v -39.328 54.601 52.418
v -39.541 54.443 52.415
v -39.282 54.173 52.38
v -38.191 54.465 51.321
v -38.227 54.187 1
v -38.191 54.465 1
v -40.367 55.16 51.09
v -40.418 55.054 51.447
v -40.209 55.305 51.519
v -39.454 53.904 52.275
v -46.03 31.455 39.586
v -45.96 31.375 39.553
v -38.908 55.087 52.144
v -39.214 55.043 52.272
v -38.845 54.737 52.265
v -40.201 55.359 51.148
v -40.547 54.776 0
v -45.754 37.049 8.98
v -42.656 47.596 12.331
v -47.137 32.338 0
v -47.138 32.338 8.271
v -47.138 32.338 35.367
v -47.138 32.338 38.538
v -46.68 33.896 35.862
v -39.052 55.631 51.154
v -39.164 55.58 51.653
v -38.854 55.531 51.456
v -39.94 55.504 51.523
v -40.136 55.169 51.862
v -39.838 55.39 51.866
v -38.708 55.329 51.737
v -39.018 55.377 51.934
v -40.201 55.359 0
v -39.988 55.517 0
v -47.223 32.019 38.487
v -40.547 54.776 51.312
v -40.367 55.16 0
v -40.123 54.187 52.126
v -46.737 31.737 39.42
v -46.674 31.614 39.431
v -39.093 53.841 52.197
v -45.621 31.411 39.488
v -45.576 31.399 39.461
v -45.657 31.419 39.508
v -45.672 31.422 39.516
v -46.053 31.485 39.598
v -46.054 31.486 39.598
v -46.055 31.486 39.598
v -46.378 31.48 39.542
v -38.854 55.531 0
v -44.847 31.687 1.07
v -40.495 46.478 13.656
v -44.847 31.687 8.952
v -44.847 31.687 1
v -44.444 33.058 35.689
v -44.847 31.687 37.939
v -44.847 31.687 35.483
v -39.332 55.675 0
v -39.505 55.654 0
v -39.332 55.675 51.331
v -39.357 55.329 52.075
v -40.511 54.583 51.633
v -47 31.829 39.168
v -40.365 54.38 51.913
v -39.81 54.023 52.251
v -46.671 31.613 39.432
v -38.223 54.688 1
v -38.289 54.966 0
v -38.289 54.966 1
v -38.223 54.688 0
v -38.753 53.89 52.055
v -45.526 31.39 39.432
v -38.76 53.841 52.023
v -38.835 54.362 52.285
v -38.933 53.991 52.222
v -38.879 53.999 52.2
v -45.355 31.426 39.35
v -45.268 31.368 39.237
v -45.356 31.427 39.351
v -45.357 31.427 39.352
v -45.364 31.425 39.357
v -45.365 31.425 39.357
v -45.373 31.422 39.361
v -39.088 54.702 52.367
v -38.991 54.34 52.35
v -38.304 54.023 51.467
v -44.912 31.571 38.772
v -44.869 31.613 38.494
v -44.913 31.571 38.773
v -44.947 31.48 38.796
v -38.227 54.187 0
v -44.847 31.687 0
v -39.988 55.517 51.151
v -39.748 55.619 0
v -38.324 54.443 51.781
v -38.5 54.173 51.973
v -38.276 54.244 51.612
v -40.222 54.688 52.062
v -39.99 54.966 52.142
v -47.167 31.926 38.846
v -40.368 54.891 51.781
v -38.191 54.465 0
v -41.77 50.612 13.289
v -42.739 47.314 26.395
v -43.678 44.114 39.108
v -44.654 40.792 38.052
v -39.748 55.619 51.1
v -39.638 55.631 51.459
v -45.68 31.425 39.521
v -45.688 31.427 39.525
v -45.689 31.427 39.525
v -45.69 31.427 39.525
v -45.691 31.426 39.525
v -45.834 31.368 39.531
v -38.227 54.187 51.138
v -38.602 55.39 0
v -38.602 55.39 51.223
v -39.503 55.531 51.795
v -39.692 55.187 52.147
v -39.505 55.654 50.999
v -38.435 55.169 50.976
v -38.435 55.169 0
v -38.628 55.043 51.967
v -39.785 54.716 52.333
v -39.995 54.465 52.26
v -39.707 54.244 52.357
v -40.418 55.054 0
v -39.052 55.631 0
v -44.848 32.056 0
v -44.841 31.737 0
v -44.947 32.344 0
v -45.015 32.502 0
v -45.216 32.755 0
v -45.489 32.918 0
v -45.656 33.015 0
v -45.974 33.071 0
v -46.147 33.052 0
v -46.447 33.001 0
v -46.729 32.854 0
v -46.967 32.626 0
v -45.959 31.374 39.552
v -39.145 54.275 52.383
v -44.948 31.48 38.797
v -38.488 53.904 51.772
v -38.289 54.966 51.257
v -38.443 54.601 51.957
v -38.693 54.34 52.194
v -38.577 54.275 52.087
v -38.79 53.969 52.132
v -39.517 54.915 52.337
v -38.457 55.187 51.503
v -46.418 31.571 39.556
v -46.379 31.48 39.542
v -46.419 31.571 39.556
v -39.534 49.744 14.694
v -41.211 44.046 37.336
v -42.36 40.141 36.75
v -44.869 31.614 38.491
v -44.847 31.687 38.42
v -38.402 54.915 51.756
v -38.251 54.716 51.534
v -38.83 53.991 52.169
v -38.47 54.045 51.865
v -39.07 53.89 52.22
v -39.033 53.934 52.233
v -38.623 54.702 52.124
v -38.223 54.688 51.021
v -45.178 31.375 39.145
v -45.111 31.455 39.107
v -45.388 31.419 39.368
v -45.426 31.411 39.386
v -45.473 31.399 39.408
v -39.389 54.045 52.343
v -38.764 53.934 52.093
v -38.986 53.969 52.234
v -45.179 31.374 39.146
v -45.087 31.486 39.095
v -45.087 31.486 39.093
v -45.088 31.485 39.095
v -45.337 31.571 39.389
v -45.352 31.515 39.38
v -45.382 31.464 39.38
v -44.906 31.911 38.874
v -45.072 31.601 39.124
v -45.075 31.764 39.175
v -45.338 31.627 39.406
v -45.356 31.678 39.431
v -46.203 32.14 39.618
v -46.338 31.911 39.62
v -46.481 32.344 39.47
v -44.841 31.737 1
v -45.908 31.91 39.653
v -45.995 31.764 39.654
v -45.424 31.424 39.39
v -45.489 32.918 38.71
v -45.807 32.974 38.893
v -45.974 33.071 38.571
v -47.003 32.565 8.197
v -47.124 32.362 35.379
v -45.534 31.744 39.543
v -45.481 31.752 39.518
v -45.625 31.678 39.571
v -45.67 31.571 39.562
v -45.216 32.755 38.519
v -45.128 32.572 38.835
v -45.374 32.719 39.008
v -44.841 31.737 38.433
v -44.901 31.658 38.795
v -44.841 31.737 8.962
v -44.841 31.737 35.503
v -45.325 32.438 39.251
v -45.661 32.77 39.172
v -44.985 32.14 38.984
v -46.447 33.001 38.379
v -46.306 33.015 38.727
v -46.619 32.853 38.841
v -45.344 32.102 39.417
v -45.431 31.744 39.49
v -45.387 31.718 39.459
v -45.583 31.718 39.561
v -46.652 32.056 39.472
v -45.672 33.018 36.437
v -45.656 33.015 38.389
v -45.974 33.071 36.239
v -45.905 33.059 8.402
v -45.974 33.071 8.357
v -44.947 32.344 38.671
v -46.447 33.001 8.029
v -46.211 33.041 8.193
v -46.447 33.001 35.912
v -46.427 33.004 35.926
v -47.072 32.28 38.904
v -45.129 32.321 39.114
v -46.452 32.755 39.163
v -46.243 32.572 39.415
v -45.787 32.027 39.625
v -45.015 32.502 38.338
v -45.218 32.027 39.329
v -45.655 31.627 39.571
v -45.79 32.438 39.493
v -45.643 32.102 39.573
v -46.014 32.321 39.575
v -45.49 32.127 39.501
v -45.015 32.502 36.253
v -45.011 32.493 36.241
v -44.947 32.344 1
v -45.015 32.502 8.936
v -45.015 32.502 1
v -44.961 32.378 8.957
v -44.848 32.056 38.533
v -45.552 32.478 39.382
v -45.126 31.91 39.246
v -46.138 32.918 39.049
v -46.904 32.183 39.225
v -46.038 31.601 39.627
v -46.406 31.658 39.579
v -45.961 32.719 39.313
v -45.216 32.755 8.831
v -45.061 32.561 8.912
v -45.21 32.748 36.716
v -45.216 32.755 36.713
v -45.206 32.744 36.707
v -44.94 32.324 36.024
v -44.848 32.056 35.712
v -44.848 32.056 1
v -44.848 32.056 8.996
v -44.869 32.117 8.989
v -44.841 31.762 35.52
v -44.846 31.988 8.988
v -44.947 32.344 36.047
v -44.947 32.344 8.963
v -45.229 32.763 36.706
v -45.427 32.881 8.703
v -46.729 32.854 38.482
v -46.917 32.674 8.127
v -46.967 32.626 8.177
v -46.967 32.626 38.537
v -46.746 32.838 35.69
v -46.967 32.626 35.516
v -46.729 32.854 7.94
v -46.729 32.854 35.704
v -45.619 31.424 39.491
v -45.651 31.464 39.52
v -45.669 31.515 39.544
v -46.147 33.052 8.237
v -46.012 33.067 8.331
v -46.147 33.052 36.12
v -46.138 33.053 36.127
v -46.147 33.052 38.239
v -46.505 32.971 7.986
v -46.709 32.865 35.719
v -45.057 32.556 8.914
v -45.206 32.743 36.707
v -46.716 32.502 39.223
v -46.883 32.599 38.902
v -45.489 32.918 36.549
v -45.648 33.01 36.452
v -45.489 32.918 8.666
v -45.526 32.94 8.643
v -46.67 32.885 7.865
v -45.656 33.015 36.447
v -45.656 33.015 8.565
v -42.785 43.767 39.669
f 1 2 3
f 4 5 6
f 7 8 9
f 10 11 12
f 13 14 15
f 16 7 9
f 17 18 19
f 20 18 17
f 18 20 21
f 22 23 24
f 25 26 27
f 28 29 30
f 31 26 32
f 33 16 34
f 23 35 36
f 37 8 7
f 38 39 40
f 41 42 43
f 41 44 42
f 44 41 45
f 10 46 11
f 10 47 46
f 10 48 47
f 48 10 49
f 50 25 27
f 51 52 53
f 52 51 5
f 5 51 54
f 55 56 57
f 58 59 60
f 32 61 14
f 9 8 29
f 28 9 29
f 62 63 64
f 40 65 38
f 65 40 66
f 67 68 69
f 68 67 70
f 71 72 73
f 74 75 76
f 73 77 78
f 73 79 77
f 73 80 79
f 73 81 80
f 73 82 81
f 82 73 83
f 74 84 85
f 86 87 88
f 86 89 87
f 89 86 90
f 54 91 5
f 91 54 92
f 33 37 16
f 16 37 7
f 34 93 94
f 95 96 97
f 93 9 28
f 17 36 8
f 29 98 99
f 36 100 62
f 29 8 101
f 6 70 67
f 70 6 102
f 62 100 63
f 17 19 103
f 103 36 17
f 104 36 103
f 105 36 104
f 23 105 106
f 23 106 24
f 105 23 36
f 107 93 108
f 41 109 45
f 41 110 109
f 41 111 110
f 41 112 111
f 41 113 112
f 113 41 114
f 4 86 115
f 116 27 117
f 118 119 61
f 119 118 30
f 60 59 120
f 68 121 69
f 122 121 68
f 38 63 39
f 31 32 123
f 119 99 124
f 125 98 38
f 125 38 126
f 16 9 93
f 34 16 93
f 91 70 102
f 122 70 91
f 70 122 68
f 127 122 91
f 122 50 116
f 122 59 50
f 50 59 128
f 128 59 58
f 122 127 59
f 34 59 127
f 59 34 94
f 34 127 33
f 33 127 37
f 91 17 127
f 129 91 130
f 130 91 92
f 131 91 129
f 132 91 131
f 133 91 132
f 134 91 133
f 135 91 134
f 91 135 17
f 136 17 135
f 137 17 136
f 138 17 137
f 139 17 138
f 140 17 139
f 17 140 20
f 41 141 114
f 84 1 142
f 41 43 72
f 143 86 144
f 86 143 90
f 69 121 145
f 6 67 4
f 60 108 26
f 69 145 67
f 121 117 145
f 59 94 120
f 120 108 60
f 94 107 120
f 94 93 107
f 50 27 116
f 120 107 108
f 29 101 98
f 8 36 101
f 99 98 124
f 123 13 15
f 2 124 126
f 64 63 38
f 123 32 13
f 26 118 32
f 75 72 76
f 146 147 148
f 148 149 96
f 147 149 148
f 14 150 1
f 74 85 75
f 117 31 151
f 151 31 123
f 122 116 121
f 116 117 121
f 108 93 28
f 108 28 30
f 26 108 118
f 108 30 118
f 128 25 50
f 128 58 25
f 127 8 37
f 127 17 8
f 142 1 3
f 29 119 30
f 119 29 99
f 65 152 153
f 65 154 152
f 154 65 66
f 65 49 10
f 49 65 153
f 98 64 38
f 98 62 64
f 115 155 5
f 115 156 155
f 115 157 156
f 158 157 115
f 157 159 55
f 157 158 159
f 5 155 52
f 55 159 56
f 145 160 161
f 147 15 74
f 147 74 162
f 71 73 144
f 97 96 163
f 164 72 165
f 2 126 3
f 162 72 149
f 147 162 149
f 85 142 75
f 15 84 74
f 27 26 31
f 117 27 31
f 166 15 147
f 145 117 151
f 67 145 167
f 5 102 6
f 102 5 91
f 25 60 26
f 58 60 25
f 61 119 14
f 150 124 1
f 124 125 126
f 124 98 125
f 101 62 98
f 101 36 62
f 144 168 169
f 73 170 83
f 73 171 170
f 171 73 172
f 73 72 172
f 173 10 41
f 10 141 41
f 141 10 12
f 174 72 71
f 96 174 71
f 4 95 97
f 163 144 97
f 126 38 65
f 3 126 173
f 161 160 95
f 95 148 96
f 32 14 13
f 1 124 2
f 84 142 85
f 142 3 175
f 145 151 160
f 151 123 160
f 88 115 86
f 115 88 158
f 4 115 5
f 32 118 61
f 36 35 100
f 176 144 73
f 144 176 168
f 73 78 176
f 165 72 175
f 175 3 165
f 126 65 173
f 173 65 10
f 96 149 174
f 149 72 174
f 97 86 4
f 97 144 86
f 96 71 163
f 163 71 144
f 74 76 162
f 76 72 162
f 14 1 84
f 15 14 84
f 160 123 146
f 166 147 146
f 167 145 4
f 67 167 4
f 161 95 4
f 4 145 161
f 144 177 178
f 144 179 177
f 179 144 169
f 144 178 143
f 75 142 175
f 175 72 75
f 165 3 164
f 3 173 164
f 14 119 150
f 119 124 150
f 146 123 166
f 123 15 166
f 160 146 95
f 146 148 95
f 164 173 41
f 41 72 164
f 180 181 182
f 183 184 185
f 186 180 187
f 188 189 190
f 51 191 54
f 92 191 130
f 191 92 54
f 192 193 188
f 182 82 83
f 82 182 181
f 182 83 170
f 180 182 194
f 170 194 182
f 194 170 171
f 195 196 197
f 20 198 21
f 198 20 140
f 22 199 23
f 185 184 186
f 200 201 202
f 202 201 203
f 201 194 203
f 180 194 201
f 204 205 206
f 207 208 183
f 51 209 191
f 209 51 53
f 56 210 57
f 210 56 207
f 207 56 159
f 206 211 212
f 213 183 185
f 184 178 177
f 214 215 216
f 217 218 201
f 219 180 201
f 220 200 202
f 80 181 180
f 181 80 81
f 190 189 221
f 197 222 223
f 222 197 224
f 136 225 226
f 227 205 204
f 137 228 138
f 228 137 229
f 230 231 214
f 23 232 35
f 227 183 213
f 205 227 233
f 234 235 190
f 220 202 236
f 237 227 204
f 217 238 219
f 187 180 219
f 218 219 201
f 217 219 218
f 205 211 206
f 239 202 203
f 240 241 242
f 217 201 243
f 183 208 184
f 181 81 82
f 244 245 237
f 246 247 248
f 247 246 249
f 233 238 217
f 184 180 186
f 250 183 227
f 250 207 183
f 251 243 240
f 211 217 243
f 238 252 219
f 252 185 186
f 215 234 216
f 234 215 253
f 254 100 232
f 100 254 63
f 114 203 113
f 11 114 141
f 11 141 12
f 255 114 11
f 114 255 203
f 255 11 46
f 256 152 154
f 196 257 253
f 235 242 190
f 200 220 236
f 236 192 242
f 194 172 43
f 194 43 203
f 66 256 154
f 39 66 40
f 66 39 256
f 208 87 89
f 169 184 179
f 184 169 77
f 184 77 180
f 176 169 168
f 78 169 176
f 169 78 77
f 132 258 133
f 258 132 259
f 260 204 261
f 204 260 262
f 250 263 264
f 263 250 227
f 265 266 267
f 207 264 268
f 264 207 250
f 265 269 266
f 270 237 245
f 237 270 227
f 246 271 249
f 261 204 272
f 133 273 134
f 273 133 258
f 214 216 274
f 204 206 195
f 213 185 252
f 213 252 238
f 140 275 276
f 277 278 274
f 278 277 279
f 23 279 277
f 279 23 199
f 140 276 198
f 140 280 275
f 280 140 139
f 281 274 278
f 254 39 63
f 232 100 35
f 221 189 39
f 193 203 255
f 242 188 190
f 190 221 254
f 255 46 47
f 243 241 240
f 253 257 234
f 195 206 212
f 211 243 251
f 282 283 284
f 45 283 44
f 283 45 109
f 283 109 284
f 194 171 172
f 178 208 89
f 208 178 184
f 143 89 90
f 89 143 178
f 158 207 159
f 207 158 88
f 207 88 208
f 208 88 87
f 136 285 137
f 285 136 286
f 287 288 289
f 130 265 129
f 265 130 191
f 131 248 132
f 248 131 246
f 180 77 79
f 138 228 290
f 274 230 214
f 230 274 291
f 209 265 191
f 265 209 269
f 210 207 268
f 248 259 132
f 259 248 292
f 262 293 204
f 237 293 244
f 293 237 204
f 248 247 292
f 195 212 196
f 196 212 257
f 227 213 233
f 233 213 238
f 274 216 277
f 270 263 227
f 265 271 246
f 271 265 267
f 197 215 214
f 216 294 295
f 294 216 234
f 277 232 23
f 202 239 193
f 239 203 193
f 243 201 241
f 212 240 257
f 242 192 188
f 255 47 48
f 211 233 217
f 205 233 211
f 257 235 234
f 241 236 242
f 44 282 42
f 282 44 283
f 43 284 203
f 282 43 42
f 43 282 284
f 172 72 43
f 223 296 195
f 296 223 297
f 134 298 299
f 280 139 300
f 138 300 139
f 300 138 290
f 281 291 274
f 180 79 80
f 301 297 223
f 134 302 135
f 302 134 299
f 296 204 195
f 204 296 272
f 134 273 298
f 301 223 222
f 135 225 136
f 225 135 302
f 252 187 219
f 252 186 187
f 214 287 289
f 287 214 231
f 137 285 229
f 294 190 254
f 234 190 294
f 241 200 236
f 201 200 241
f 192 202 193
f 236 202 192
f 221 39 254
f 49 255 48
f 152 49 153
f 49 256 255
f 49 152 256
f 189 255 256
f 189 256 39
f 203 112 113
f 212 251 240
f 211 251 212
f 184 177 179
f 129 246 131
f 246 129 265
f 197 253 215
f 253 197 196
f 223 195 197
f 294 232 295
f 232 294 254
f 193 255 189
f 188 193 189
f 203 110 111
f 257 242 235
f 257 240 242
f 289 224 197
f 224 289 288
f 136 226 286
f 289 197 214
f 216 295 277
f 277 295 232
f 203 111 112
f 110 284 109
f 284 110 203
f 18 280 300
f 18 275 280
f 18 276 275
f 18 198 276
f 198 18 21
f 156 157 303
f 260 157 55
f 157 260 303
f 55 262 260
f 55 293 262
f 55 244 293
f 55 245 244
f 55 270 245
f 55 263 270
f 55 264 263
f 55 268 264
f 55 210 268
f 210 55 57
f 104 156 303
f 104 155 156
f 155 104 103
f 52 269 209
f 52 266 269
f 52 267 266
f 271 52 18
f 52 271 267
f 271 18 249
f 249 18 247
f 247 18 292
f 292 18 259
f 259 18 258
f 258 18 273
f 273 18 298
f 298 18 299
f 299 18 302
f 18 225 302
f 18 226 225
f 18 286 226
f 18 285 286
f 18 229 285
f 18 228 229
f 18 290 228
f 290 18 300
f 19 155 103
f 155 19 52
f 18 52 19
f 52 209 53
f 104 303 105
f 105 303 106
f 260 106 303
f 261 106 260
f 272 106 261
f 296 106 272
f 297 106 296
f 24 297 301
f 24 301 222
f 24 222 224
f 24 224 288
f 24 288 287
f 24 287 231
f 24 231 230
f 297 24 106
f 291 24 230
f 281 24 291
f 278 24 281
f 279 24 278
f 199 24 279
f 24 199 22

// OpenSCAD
difference () {
  hull () {
    hull () {
      translate ([0, 0, 13]) {
        rotate (a=14.999999999999998, v=[0, 1, 0]) {
          translate ([0, -4.35, 5.64]) {
            translate ([0, 0, 241.94387877597407]) {
              rotate (a=12.500000000000004, v=[0, 1, 0]) {
                translate ([0, 0, -241.94387877597407]) {
                  translate ([0, 0, 84.31095110414394]) {
                    rotate (a=32.7, v=[1, 0, 0]) {
                      translate ([0, 0, -84.31095110414394]) {
                        translate ([1, -1, 1]) {
                          translate ([0, 13.575, -6]) {
                            sphere ($fn=20, r=1.2);
                          }
                        }
                      }
                    }
                  }
                }
              }
            }
          }
        }
      }
      translate ([0, 0, 1/2]) {
        linear_extrude (height=1, twist=0.0, convexity=0, center=true){
          projection (cut = false) {
            translate ([0, 0, 13]) {
              rotate (a=14.999999999999998, v=[0, 1, 0]) {
                translate ([0, -4.35, 5.64]) {
                  translate ([0, 0, 241.94387877597407]) {
                    rotate (a=12.500000000000004, v=[0, 1, 0]) {
                      translate ([0, 0, -241.94387877597407]) {
                        translate ([0, 0, 84.31095110414394]) {
                          rotate (a=32.7, v=[1, 0, 0]) {
                            translate ([0, 0, -84.31095110414394]) {
                              translate ([1, -1, 1]) {
                                translate ([0, 13.575, -6]) {
                                  sphere ($fn=20, r=1.2);
                                }
                              }
                            }
                          }
                        }
                      }
                    }
                  }
                }
              }
            }
          }
        }
      }
    }
    hull () {
      translate ([0, 0, 13]) {
        rotate (a=14.999999999999998, v=[0, 1, 0]) {
          translate ([0, -4.35, 5.64]) {
            translate ([0, 0, 241.94387877597407]) {
              rotate (a=12.500000000000004, v=[0, 1, 0]) {
                translate ([0, 0, -241.94387877597407]) {
                  translate ([0, 0, 84.31095110414394]) {
                    rotate (a=14.999999999999998, v=[1, 0, 0]) {
                      translate ([0, 0, -84.31095110414394]) {
                        translate ([1, 0, 1]) {
                          translate ([0, 13.575, -6]) {
                            sphere ($fn=20, r=1.2);
                          }
                        }
                      }
                    }
                  }
                }
              }
            }
          }
        }
      }
      translate ([0, 0, 1/2]) {
        linear_extrude (height=1, twist=0.0, convexity=0, center=true){
          projection (cut = false) {
            translate ([0, 0, 13]) {
              rotate (a=14.999999999999998, v=[0, 1, 0]) {
                translate ([0, -4.35, 5.64]) {
                  translate ([0, 0, 241.94387877597407]) {
                    rotate (a=12.500000000000004, v=[0, 1, 0]) {
                      translate ([0, 0, -241.94387877597407]) {
                        translate ([0, 0, 84.31095110414394]) {
                          rotate (a=14.999999999999998, v=[1, 0, 0]) {
                            translate ([0, 0, -84.31095110414394]) {
                              translate ([1, 0, 1]) {
                                translate ([0, 13.575, -6]) {
                                  sphere ($fn=20, r=1.2);
                                }
                              }
                            }
                          }
                        }
                      }
                    }
                  }
                }
              }
            }
          }
        }
      }
    }
  }
  hull () {
    hull () {
      translate ([0, 0, 13]) {
        rotate (a=14.999999999999998, v=[0, 1, 0]) {
          translate ([0, -4.35, 5.64]) {
            translate ([0, 0, 241.94387877597407]) {
              rotate (a=12.500000000000004, v=[0, 1, 0]) {
                translate ([0, 0, -241.94387877597407]) {
                  translate ([0, 0, 84.31095110414394]) {
                    rotate (a=14.999999999999998, v=[1, 0, 0]) {
                      translate ([0, 0, -84.31095110414394]) {
                        translate ([1, 0, 1]) {
                          translate ([0, 13.575, -6]) {
                            sphere ($fn=20, r=1.2);
                          }
                        }
                      }
                    }
                  }
                }
              }
            }
          }
        }
      }
      translate ([0, 0, 1/2]) {
        linear_extrude (height=1, twist=0.0, convexity=0, center=true){
          projection (cut = false) {
            translate ([0, 0, 13]) {
              rotate (a=14.999999999999998, v=[0, 1, 0]) {
                translate ([0, -4.35, 5.64]) {
                  translate ([0, 0, 241.94387877597407]) {
                    rotate (a=12.500000000000004, v=[0, 1, 0]) {
                      translate ([0, 0, -241.94387877597407]) {
                        translate ([0, 0, 84.31095110414394]) {
                          rotate (a=14.999999999999998, v=[1, 0, 0]) {
                            translate ([0, 0, -84.31095110414394]) {
                              translate ([1, 0, 1]) {
                                translate ([0, 13.575, -6]) {
                                  sphere ($fn=20, r=1.2);
                                }
                              }
                            }
                          }
                        }
                      }
                    }
                  }
                }
              }
            }
          }
        }
      }
    }
    hull () {
      translate ([0, 0, 13]) {
        rotate (a=14.999999999999998, v=[0, 1, 0]) {
          translate ([0, -4.35, 5.64]) {
            translate ([0, 0, 241.94387877597407]) {
              rotate (a=12.500000000000004, v=[0, 1, 0]) {
                translate ([0, 0, -241.94387877597407]) {
                  translate ([0, 0, 84.31095110414394]) {
                    rotate (a=0.0, v=[1, 0, 0]) {
                      translate ([0, 0, -84.31095110414394]) {
                        translate ([1, 0, 1]) {
                          translate ([0, 13.575, -6]) {
                            sphere ($fn=20, r=1.2);
                          }
                        }
                      }
                    }
                  }
                }
              }
            }
          }
        }
      }
      translate ([0, 0, 1/2]) {
        linear_extrude (height=1, twist=0.0, convexity=0, center=true){
          projection (cut = false) {
            translate ([0, 0, 13]) {
              rotate (a=14.999999999999998, v=[0, 1, 0]) {
                translate ([0, -4.35, 5.64]) {
                  translate ([0, 0, 241.94387877597407]) {
                    rotate (a=12.500000000000004, v=[0, 1, 0]) {
                      translate ([0, 0, -241.94387877597407]) {
                        translate ([0, 0, 84.31095110414394]) {
                          rotate (a=0.0, v=[1, 0, 0]) {
                            translate ([0, 0, -84.31095110414394]) {
                              translate ([1, 0, 1]) {
                                translate ([0, 13.575, -6]) {
                                  sphere ($fn=20, r=1.2);
                                }
                              }
                            }
                          }
                        }
                      }
                    }
                  }
                }
              }
            }
          }
        }
      }
    }
  }
  hull () {
    hull () {
      translate ([0, 0, 13]) {
        rotate (a=14.999999999999998, v=[0, 1, 0]) {
          translate ([0, -4.35, 5.64]) {
            translate ([0, 0, 241.94387877597407]) {
              rotate (a=12.500000000000004, v=[0, 1, 0]) {
                translate ([0, 0, -241.94387877597407]) {
                  translate ([0, 0, 84.31095110414394]) {
                    rotate (a=0.0, v=[1, 0, 0]) {
                      translate ([0, 0, -84.31095110414394]) {
                        translate ([1, 0, 1]) {
                          translate ([0, 13.575, -6]) {
                            sphere ($fn=20, r=1.2);
                          }
                        }
                      }
                    }
                  }
                }
              }
            }
          }
        }
      }
      translate ([0, 0, 1/2]) {
        linear_extrude (height=1, twist=0.0, convexity=0, center=true){
          projection (cut = false) {
            translate ([0, 0, 13]) {
              rotate (a=14.999999999999998, v=[0, 1, 0]) {
                translate ([0, -4.35, 5.64]) {
                  translate ([0, 0, 241.94387877597407]) {
                    rotate (a=12.500000000000004, v=[0, 1, 0]) {
                      translate ([0, 0, -241.94387877597407]) {
                        translate ([0, 0, 84.31095110414394]) {
                          rotate (a=0.0, v=[1, 0, 0]) {
                            translate ([0, 0, -84.31095110414394]) {
                              translate ([1, 0, 1]) {
                                translate ([0, 13.575, -6]) {
                                  sphere ($fn=20, r=1.2);
                                }
                              }
                            }
                          }
                        }
                      }
                    }
                  }
                }
              }
            }
          }
        }
      }
    }
    hull () {
      translate ([0, 0, 13]) {
        rotate (a=14.999999999999998, v=[0, 1, 0]) {
          translate ([0, -4.35, 5.64]) {
            translate ([0, 0, 241.94387877597407]) {
              rotate (a=12.500000000000004, v=[0, 1, 0]) {
                translate ([0, 0, -241.94387877597407]) {
                  translate ([0, 0, 84.31095110414394]) {
                    rotate (a=5.000999999999999, v=[1, 0, 0]) {
                      translate ([0, 0, -84.31095110414394]) {
                        translate ([1, 0, 1]) {
                          translate ([0, -12.075, -6]) {
                            sphere ($fn=20, r=1.2);
                          }
                        }
                      }
                    }
                  }
                }
              }
            }
          }
        }
      }
      translate ([0, 0, 1/2]) {
        linear_extrude (height=1, twist=0.0, convexity=0, center=true){
          projection (cut = false) {
            translate ([0, 0, 13]) {
              rotate (a=14.999999999999998, v=[0, 1, 0]) {
                translate ([0, -4.35, 5.64]) {
                  translate ([0, 0, 241.94387877597407]) {
                    rotate (a=12.500000000000004, v=[0, 1, 0]) {
                      translate ([0, 0, -241.94387877597407]) {
                        translate ([0, 0, 84.31095110414394]) {
                          rotate (a=5.000999999999999, v=[1, 0, 0]) {
                            translate ([0, 0, -84.31095110414394]) {
                              translate ([1, 0, 1]) {
                                translate ([0, -12.075, -6]) {
                                  sphere ($fn=20, r=1.2);
                                }
                              }
                            }
                          }
                        }
                      }
                    }
                  }
                }
              }
            }
          }
        }
      }
    }
  }
  hull () {
    hull () {
      translate ([0, 0, 13]) {
        rotate (a=14.999999999999998, v=[0, 1, 0]) {
          translate ([0, -4.35, 5.64]) {
            translate ([0, 0, 241.94387877597407]) {
              rotate (a=12.500000000000004, v=[0, 1, 0]) {
                translate ([0, 0, -241.94387877597407]) {
                  translate ([0, 0, 84.31095110414394]) {
                    rotate (a=5.000999999999999, v=[1, 0, 0]) {
                      translate ([0, 0, -84.31095110414394]) {
                        translate ([1, 0, 1]) {
                          translate ([0, -12.075, -6]) {
                            sphere ($fn=20, r=1.2);
                          }
                        }
                      }
                    }
                  }
                }
              }
            }
          }
        }
      }
      translate ([0, 0, 1/2]) {
        linear_extrude (height=1, twist=0.0, convexity=0, center=true){
          projection (cut = false) {
            translate ([0, 0, 13]) {
              rotate (a=14.999999999999998, v=[0, 1, 0]) {
                translate ([0, -4.35, 5.64]) {
                  translate ([0, 0, 241.94387877597407]) {
                    rotate (a=12.500000000000004, v=[0, 1, 0]) {
                      translate ([0, 0, -241.94387877597407]) {
                        translate ([0, 0, 84.31095110414394]) {
                          rotate (a=5.000999999999999, v=[1, 0, 0]) {
                            translate ([0, 0, -84.31095110414394]) {
                              translate ([1, 0, 1]) {
                                translate ([0, -12.075, -6]) {
                                  sphere ($fn=20, r=1.2);
                                }
                              }
                            }
                          }
                        }
                      }
                    }
                  }
                }
              }
            }
          }
        }
      }
    }
  }
  translate ([-47, 28, 21]) {
    rotate (a=14.999999999999998, v=[1, 0, 0]) {
      rotate (a=12.0, v=[0, 0, -1]) {
        rotate (a=235.31324031235482, v=[0, 1, 0]) {
          cube ([23, 41, 15.8], center=true);
        }
      }
    }
  }
}
